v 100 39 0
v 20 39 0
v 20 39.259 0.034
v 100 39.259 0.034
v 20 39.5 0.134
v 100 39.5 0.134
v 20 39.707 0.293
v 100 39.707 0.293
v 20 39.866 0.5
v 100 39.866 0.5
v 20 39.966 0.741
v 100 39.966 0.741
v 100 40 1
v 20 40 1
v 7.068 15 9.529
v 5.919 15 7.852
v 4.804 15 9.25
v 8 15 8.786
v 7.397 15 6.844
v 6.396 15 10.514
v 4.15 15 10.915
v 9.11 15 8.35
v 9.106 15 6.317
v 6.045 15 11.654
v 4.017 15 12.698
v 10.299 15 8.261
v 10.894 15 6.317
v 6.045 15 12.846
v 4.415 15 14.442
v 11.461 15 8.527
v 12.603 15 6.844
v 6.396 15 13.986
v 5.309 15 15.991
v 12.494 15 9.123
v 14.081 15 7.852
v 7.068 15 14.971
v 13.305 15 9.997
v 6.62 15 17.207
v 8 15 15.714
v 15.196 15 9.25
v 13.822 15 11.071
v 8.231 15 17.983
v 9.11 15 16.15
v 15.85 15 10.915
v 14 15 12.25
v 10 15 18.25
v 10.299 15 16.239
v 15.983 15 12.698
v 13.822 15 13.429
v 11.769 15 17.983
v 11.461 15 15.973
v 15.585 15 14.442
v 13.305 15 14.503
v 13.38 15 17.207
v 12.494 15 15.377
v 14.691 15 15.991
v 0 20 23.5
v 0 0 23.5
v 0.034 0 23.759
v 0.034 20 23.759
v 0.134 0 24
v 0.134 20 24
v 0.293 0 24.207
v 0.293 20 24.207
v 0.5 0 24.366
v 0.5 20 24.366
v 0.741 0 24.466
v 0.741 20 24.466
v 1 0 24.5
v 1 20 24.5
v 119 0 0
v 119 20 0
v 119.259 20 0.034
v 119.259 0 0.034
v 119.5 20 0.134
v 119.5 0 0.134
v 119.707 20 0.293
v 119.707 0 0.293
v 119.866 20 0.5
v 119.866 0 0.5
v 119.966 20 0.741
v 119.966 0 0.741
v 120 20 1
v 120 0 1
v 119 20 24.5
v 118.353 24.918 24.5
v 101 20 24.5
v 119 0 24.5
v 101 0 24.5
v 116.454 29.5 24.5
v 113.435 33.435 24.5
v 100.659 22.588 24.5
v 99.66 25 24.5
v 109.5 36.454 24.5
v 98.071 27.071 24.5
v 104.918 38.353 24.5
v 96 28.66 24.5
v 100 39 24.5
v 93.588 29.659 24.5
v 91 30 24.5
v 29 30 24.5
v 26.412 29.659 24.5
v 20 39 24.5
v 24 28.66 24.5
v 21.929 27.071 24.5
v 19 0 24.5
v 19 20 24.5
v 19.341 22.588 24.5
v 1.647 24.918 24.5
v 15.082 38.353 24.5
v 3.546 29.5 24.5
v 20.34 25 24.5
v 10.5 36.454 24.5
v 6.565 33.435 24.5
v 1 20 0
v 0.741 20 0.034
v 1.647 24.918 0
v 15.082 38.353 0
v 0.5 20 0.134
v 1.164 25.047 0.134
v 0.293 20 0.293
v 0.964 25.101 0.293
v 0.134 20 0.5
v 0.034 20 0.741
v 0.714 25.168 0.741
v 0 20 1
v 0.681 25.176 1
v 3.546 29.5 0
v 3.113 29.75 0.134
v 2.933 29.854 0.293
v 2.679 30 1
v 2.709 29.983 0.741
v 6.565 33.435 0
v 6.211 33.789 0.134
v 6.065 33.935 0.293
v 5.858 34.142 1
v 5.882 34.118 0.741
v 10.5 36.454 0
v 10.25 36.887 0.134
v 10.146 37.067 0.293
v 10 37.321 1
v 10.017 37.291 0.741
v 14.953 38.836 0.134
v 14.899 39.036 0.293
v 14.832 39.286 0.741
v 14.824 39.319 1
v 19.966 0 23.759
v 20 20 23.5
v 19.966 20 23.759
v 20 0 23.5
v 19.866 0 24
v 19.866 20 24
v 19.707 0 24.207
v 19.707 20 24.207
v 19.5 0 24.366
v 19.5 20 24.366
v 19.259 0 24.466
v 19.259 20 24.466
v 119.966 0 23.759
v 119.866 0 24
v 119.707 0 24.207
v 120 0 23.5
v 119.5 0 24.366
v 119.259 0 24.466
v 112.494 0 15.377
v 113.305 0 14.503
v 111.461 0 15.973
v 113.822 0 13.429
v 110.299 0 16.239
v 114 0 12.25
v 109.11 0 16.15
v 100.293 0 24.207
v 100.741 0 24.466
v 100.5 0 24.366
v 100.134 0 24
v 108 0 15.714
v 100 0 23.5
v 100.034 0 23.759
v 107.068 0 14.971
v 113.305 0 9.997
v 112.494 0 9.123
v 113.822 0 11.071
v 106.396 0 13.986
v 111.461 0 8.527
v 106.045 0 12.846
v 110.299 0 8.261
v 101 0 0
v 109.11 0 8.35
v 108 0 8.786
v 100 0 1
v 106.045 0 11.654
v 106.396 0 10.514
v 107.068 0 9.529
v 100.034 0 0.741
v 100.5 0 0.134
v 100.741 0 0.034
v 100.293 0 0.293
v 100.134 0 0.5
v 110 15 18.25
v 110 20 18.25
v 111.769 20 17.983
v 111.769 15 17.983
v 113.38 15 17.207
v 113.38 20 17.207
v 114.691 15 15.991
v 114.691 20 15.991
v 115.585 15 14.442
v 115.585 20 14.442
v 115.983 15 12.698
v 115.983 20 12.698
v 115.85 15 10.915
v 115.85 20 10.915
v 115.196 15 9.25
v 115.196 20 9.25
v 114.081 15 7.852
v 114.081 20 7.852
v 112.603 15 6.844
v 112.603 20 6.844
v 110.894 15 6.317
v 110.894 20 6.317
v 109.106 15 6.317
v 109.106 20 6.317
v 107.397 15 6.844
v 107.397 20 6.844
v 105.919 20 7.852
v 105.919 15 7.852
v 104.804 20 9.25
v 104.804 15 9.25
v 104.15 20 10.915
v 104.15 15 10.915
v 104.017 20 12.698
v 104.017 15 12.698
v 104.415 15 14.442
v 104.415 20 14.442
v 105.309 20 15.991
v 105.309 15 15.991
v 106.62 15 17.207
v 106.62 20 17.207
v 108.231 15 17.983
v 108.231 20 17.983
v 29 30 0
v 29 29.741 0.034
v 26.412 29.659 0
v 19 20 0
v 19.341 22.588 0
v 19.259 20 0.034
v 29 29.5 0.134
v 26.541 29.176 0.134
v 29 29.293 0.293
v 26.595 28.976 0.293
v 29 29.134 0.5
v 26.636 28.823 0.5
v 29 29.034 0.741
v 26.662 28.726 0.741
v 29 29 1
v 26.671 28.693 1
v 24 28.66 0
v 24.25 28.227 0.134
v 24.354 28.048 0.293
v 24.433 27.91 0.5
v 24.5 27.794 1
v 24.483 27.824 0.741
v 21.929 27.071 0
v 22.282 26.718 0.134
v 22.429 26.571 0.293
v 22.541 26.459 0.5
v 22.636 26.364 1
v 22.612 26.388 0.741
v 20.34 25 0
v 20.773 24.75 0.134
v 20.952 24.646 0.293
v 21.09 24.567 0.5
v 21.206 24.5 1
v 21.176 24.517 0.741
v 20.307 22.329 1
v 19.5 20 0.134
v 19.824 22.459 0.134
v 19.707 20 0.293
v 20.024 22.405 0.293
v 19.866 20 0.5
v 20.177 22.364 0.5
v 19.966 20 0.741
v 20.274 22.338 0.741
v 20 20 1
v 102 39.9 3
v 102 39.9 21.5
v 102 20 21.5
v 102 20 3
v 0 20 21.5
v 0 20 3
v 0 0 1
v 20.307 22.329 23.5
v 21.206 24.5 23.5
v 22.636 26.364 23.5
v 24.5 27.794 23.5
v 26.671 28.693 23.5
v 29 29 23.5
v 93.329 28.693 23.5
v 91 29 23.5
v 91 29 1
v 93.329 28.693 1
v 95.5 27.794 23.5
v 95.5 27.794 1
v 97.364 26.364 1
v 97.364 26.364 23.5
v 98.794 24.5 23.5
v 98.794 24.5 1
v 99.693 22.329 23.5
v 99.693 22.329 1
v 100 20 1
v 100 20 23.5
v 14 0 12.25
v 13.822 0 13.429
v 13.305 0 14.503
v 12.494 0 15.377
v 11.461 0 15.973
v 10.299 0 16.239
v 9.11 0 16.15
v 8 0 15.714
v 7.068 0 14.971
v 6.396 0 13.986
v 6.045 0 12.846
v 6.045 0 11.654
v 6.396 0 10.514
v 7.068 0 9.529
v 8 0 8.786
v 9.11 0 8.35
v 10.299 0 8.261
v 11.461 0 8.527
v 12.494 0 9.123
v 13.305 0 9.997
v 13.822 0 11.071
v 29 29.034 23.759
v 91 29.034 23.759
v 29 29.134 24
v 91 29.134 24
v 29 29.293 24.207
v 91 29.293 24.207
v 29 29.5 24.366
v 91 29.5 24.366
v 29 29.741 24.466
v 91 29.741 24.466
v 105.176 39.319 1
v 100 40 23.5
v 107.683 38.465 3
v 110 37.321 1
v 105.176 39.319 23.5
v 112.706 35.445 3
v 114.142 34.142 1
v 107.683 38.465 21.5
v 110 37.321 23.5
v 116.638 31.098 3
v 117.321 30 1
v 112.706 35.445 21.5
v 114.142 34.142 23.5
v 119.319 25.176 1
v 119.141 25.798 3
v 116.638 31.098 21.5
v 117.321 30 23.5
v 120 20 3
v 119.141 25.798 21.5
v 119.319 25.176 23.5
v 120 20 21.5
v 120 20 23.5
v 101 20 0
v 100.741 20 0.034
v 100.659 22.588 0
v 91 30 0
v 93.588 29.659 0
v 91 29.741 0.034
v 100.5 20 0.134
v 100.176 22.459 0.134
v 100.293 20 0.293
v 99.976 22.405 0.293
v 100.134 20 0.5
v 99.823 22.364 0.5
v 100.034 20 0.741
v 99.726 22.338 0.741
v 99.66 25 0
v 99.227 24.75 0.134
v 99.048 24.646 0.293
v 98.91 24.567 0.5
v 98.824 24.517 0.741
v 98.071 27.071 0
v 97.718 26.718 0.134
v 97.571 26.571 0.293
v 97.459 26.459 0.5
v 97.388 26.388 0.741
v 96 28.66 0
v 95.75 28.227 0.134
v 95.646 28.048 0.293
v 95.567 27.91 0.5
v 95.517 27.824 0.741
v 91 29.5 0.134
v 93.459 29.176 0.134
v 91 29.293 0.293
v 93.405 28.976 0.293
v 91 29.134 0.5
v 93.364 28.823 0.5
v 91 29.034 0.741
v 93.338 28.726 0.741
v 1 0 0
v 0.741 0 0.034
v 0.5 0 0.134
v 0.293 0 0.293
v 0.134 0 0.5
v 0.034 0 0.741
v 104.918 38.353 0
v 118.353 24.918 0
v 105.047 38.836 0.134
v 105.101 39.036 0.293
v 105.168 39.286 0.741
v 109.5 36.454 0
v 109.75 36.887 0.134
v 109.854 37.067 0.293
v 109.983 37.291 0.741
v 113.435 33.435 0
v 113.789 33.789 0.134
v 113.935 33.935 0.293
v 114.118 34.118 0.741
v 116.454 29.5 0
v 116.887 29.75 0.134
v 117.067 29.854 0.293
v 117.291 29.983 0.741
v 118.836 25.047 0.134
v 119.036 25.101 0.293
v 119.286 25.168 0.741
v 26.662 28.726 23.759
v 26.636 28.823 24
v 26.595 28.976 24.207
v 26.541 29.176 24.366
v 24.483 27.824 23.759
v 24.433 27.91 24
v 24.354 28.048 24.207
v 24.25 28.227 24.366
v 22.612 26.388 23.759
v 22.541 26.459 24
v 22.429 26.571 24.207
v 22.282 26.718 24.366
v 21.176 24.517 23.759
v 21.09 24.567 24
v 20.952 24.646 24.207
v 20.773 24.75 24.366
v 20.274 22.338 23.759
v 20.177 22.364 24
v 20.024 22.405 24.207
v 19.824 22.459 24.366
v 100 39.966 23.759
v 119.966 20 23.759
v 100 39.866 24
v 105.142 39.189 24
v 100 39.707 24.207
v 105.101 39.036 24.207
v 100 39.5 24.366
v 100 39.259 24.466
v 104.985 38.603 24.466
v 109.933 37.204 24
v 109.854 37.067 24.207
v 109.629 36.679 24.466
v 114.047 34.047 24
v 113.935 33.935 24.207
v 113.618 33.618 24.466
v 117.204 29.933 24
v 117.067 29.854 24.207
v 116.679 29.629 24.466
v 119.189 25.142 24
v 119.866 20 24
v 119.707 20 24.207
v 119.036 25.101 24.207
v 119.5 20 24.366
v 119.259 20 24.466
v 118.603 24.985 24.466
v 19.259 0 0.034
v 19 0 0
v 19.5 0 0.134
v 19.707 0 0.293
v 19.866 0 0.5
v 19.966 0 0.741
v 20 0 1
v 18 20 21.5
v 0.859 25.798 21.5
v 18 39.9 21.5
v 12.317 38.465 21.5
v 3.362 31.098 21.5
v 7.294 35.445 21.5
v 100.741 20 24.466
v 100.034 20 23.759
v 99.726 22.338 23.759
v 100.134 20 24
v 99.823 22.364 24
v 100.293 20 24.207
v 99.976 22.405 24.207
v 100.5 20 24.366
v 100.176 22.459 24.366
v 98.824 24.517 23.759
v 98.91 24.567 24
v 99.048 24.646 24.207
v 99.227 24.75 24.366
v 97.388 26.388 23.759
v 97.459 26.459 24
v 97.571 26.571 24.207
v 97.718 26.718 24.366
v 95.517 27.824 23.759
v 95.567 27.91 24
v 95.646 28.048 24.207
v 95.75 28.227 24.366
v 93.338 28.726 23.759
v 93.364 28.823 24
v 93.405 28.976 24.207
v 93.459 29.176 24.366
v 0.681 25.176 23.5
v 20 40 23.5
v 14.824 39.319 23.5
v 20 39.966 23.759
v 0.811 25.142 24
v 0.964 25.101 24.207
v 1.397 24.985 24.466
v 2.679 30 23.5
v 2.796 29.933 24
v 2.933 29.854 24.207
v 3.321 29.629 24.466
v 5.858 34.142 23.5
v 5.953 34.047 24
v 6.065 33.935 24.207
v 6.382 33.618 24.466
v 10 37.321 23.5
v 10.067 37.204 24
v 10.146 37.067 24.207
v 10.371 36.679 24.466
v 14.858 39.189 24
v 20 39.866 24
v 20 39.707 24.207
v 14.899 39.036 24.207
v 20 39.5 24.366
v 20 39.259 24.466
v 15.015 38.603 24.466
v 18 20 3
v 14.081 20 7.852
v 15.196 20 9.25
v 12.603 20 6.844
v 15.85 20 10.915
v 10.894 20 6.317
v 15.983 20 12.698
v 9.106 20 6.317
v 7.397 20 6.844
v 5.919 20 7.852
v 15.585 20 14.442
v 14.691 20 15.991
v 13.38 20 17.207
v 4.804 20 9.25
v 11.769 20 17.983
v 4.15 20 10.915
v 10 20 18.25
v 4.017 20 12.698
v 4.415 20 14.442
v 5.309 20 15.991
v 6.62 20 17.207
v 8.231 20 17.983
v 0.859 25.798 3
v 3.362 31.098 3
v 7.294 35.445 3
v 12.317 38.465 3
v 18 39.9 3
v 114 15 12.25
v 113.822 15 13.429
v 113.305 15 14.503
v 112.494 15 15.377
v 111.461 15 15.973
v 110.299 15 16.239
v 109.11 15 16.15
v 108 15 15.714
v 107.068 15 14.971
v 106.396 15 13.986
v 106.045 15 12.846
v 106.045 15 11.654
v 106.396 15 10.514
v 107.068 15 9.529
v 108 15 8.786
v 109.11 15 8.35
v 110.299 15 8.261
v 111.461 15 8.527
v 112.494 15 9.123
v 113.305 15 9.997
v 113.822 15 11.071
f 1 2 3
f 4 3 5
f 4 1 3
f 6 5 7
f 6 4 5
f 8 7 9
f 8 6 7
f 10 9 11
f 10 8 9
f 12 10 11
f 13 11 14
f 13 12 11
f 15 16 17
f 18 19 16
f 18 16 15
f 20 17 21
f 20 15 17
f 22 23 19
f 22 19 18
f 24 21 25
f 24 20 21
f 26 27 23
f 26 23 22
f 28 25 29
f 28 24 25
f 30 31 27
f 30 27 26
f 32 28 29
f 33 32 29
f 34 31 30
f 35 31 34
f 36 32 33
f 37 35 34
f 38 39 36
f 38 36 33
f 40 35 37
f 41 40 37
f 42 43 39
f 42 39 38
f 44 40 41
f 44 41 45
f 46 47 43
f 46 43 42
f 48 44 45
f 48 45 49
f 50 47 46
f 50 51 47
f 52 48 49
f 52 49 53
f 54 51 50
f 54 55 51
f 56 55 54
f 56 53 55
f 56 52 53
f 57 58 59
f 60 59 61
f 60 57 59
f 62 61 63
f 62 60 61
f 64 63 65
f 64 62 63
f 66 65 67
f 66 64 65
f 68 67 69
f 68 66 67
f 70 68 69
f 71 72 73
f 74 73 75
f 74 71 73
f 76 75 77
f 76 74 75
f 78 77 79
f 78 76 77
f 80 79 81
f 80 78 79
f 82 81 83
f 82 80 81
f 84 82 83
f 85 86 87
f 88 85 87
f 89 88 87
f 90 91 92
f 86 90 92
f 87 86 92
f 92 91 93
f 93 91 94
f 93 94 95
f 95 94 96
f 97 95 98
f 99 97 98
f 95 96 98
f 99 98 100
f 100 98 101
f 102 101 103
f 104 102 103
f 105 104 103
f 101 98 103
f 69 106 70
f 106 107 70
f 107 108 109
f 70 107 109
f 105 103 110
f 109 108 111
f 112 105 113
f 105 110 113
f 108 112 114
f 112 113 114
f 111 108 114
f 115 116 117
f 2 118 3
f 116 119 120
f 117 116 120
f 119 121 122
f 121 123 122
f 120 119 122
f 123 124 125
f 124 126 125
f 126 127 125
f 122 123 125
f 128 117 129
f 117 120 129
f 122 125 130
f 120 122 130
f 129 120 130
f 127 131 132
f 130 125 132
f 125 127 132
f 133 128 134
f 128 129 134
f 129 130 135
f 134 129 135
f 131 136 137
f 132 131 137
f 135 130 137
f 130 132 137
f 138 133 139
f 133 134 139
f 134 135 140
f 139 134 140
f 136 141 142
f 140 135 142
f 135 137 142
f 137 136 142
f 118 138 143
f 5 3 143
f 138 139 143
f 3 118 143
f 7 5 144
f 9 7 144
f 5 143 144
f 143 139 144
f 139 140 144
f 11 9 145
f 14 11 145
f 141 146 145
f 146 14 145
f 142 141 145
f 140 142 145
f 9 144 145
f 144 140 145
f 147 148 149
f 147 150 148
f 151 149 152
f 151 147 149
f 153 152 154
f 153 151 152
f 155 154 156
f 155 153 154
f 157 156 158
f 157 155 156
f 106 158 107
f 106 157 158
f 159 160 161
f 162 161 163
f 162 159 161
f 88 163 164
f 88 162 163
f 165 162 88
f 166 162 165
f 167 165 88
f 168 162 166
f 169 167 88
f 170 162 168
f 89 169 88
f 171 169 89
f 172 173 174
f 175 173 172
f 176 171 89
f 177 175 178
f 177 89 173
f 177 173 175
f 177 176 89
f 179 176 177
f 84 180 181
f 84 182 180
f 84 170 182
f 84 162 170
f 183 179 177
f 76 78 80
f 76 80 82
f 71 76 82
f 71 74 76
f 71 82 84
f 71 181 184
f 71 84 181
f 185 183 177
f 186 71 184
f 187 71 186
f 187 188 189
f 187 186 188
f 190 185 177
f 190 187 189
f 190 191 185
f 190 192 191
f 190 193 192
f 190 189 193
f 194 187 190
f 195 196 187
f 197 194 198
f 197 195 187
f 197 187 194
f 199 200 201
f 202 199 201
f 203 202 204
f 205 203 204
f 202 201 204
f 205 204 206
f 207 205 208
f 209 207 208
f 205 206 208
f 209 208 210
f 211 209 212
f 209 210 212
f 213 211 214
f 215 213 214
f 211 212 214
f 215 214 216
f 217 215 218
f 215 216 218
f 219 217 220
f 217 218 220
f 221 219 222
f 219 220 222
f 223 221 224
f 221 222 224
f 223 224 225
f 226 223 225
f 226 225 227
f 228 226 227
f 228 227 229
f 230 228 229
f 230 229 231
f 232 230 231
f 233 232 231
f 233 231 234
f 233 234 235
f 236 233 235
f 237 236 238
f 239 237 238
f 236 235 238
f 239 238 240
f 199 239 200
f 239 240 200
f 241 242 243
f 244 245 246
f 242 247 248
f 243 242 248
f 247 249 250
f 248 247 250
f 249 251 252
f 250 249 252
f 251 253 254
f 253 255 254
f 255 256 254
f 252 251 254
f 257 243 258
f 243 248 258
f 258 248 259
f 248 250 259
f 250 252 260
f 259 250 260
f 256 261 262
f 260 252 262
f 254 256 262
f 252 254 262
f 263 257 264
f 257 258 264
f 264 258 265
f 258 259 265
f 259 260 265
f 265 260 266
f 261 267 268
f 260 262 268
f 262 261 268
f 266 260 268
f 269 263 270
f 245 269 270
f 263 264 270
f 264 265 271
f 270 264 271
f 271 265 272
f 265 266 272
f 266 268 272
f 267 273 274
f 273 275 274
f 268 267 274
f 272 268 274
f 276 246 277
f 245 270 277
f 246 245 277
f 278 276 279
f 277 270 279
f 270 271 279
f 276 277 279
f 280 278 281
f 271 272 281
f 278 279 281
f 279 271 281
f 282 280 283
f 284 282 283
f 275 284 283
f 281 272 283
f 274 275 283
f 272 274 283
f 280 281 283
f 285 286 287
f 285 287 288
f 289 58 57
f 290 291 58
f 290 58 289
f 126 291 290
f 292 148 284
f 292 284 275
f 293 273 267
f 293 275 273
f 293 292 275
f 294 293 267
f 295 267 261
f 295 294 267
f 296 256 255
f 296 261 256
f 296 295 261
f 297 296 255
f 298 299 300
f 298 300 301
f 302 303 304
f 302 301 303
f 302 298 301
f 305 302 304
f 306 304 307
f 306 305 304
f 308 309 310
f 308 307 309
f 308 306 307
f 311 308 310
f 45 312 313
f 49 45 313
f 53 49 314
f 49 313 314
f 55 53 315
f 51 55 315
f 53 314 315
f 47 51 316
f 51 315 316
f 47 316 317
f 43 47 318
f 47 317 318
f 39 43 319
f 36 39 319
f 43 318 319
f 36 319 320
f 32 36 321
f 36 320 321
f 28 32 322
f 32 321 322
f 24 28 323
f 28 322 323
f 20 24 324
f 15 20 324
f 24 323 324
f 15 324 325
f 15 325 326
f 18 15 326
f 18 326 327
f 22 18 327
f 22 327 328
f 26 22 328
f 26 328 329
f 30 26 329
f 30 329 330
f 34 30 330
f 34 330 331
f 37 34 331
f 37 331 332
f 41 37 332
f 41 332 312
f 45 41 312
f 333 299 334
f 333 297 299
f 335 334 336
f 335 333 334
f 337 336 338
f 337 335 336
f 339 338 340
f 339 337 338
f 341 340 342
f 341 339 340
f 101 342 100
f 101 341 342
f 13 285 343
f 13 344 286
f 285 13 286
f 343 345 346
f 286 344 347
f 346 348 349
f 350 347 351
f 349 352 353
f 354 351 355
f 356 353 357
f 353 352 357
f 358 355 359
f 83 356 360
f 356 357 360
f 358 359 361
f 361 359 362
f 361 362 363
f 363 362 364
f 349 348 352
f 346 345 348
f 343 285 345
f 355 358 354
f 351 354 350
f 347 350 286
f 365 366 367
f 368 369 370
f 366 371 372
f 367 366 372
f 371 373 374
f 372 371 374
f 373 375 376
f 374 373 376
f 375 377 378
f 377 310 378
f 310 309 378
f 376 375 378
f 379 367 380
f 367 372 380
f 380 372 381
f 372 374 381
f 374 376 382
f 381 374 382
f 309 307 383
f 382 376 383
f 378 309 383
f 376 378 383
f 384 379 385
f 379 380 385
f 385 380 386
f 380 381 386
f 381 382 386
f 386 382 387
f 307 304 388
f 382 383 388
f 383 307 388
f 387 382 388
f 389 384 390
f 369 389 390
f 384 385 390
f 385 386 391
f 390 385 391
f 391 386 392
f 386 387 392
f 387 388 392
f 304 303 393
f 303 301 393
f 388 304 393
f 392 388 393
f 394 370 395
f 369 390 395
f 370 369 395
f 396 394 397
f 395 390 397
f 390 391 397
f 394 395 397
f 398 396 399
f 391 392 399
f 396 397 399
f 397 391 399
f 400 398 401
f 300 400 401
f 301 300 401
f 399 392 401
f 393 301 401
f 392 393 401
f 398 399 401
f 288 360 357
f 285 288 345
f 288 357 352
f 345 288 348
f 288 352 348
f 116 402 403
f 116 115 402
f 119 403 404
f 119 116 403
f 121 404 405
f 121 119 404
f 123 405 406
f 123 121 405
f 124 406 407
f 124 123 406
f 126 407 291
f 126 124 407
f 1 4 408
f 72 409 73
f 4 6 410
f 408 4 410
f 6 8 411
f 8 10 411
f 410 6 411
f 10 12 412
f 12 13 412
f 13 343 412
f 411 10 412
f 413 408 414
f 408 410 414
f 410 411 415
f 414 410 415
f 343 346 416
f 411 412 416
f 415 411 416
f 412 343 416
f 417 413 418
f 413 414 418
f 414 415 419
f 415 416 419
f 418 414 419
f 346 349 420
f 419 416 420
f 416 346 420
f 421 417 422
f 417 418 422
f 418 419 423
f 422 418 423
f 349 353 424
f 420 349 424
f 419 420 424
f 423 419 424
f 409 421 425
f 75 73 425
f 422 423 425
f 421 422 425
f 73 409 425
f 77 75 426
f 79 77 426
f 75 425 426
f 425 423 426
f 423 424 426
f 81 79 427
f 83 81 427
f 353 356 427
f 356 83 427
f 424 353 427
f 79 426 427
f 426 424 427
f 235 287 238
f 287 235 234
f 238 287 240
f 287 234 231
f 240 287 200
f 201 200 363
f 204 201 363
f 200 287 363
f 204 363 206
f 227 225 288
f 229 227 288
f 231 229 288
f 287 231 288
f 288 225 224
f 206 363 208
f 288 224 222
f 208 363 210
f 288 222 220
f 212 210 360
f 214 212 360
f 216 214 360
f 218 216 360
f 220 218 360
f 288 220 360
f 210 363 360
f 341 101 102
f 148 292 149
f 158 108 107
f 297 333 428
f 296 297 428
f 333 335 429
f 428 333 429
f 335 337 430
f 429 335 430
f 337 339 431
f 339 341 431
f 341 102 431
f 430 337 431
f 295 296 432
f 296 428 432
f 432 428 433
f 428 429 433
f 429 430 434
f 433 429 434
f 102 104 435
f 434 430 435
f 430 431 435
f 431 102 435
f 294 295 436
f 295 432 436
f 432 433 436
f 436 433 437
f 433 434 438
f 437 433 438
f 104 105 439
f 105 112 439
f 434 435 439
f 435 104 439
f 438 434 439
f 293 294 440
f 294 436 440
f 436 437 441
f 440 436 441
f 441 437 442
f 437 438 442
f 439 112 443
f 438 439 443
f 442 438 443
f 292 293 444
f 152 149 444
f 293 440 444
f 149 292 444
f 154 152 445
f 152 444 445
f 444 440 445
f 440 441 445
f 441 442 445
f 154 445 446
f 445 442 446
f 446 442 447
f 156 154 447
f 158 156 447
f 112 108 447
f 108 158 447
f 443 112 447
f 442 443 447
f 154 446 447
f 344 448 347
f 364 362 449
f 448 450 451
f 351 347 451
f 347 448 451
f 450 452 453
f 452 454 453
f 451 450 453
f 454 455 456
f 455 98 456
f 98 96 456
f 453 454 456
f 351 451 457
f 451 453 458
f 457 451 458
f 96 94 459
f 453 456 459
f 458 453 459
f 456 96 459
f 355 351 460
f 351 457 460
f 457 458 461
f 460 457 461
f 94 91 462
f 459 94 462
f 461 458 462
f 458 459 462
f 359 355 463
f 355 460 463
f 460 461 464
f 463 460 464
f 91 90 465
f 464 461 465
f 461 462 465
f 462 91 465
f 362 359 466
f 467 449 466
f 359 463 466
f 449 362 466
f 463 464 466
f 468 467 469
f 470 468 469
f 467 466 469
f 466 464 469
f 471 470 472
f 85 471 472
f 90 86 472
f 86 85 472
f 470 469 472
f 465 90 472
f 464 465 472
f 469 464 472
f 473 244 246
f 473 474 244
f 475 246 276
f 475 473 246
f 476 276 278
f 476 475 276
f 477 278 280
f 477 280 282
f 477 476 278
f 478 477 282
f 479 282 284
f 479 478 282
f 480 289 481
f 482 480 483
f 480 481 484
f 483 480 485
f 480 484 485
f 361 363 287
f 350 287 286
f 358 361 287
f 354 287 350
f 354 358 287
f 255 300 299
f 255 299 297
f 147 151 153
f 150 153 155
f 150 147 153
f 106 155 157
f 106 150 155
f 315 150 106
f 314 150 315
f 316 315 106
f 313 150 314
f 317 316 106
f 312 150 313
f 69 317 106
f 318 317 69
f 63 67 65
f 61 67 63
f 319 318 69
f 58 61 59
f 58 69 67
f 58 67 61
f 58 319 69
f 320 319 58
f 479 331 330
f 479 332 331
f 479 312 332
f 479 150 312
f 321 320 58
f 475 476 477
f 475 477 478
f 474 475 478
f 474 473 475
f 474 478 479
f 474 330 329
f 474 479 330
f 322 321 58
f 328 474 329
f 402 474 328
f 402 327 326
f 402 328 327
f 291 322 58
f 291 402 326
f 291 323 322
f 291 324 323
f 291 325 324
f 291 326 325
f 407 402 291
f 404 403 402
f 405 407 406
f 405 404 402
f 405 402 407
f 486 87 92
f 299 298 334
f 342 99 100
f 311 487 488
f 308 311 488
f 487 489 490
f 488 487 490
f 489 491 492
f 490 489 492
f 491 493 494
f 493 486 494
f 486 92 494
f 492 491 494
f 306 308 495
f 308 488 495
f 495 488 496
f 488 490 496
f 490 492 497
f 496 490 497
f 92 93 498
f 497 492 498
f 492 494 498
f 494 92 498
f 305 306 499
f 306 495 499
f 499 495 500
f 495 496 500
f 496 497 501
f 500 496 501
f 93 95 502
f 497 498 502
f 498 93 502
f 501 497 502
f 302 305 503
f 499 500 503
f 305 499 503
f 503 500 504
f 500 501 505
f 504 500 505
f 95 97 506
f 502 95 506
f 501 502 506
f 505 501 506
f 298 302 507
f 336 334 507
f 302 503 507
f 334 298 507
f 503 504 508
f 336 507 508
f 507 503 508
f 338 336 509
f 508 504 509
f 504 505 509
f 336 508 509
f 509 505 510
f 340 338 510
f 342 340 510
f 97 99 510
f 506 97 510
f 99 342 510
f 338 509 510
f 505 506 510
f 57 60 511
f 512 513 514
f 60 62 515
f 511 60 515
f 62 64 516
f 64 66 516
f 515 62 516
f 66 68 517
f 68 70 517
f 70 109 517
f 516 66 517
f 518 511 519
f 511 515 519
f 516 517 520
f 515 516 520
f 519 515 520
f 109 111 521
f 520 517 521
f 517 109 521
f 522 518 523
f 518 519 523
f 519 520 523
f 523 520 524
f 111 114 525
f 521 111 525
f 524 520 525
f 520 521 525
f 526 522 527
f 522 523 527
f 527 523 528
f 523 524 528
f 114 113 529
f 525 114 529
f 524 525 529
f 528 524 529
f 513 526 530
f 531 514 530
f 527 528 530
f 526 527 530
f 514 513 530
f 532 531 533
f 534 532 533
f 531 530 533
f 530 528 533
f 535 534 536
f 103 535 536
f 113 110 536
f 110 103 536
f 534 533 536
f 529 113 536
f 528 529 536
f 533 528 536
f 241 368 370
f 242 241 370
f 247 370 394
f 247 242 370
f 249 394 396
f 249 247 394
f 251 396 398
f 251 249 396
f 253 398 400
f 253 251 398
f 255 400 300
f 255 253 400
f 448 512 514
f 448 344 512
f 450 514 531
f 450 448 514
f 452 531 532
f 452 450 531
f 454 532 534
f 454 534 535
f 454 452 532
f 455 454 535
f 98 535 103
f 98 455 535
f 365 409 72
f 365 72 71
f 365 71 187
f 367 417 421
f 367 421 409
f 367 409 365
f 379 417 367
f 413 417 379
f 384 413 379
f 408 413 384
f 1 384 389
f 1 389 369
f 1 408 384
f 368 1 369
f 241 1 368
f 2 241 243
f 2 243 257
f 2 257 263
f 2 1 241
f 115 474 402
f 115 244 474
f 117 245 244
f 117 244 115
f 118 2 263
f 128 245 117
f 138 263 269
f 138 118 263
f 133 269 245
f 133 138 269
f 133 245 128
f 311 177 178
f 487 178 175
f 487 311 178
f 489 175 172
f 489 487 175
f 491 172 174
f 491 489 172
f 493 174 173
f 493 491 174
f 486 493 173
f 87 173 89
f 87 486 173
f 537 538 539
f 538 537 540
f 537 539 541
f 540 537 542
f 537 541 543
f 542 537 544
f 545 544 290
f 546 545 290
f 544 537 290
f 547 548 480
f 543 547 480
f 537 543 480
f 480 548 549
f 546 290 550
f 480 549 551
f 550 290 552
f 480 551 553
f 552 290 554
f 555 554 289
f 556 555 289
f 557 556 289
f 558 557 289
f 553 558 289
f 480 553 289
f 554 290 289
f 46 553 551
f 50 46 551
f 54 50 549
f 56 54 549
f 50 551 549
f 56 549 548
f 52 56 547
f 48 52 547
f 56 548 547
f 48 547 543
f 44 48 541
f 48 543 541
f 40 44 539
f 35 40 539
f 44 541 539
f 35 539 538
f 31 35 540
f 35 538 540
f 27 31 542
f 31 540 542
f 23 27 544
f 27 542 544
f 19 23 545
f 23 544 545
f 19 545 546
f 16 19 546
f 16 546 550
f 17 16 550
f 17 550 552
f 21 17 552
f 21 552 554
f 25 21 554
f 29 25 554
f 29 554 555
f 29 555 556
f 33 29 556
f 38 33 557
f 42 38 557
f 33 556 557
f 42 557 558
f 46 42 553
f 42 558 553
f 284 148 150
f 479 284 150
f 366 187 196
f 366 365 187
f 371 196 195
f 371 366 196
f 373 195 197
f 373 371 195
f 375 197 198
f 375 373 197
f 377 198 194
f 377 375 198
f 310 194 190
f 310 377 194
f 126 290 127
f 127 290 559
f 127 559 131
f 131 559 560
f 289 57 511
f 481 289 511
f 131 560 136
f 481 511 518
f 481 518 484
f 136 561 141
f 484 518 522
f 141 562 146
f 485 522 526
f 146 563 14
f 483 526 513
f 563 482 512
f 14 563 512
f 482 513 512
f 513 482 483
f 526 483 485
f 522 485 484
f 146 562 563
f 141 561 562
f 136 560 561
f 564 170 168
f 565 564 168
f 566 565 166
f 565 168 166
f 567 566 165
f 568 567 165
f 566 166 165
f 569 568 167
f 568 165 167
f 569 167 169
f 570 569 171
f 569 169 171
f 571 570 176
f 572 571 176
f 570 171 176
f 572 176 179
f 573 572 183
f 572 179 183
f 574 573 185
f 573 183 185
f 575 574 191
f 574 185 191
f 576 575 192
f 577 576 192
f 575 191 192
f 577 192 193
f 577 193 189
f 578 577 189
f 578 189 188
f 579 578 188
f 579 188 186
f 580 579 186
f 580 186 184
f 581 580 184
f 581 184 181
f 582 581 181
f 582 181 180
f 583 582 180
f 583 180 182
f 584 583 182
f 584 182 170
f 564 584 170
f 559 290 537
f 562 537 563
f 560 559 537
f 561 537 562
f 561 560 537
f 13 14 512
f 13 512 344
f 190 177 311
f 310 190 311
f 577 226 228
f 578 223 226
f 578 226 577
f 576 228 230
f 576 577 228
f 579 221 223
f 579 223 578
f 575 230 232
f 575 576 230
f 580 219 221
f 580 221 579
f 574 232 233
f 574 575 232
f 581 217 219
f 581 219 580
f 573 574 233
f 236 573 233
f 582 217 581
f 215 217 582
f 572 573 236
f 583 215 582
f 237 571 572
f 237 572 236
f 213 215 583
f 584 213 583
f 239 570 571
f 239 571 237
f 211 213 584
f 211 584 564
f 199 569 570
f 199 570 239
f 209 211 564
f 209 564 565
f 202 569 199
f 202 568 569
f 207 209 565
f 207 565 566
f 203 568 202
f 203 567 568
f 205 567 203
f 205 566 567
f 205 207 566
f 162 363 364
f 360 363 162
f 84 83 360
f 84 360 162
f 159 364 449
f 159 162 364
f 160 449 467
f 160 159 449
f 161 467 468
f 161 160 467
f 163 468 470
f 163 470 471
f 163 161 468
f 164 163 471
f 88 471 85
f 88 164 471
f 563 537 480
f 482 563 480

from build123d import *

# Parameters (mm, degrees)
EXTRUDE_1_DEPTH     = 24.5
FILLET_1_R          = 20
FILLET_2_R          = 9
SKETCH_2_W          = 18.5
SKETCH_2_H          = 26.060105981
CUT_EXTRUDE_1_DEPTH = 18
SKETCH_3_W          = 18.5
SKETCH_3_H          = 21.487076152
CUT_EXTRUDE_2_DEPTH = 18
FILLET_3_R          = 1
SKETCH_6_R          = 4
CUT_EXTRUDE_3_DEPTH = 129.841957452
SKETCH_7_R          = 6
CUT_EXTRUDE_4_DEPTH = 5


with BuildPart() as part:
    # Эскиз1 → Бобышка-Вытянуть1 (new body)
    with BuildSketch(Plane.XY):
        Polygon((0, 0), (0, 40), (120, 40), (120, 0), (100, 0), (100, 29), (20, 29), (20, 0), align=None)
    extrude(amount=EXTRUDE_1_DEPTH)

    # Скругление1
    fillet_1_edges = [part.edges().sort_by_distance(p)[0] for p in [
        (0, 40, 12.25),
        (120, 40, 12.25),
    ]]
    fillet(fillet_1_edges, radius=FILLET_1_R)

    # Скругление2
    fillet_2_edges = [part.edges().sort_by_distance(p)[0] for p in [
        (100, 29, 12.25),
        (20, 29, 12.25),
    ]]
    fillet(fillet_2_edges, radius=FILLET_2_R)

    # Эскиз2 → Вырез-Вытянуть1 (cut)
    with BuildSketch(Plane(origin=(120, 0, 0), x_dir=(0, 0, -1), z_dir=(1, 0, 0))):
        with Locations((-12.25, 33.03005299)):
            Rectangle(SKETCH_2_W, SKETCH_2_H)
    extrude(amount=-CUT_EXTRUDE_1_DEPTH, mode=Mode.SUBTRACT)

    # Эскиз3 → Вырез-Вытянуть2 (cut)
    with BuildSketch(Plane.ZY):
        with Locations((12.25, 30.743538076)):
            Rectangle(SKETCH_3_W, SKETCH_3_H)
    extrude(amount=-CUT_EXTRUDE_2_DEPTH, mode=Mode.SUBTRACT)

    # Скругление3
    fillet_3_edges = [part.edges().sort_by_distance(p)[0] for p in [
        (20, 10, 0),
        (120, 10, 24.5),
        (0, 10, 0),
        (0, 10, 24.5),
        (60, 40, 0),
        (114.142135624, 34.142135624, 0),
        (5.857864376, 34.142135624, 0),
        (60, 40, 24.5),
        (114.142135624, 34.142135624, 24.5),
        (5.857864376, 34.142135624, 24.5),
        (60, 29, 0),
        (60, 29, 24.5),
        (100, 10, 0),
        (100, 10, 24.5),
        (22.636038969, 26.363961031, 0),
        (22.636038969, 26.363961031, 24.5),
        (97.363961031, 26.363961031, 0),
        (97.363961031, 26.363961031, 24.5),
        (20, 10, 24.5),
        (120, 10, 0),
    ]]
    fillet(fillet_3_edges, radius=FILLET_3_R)

    # Эскиз6 → Вырез-Вытянуть3 (cut, through all)
    with BuildSketch(Plane(origin=(0, 0, 0), x_dir=(-1, 0, 0), z_dir=(0, -1, 0))):
        with Locations(Location((-10, -12.25, 0), (0, 0, 180))):
            Circle(SKETCH_6_R)
        with Locations(Location((-110, -12.25, 0), (0, 0, 180))):
            Circle(SKETCH_6_R)
    extrude(amount=-CUT_EXTRUDE_3_DEPTH, mode=Mode.SUBTRACT)

    # Эскиз7 → Вырез-Вытянуть4 (cut)
    with BuildSketch(Plane(origin=(0, 20, 0), x_dir=(1, 0, 0), z_dir=(0, 1, 0))):
        with Locations(Location((10, -12.25, 0), (0, 0, 270))):
            Circle(SKETCH_7_R)
        with Locations(Location((110, -12.25, 0), (0, 0, 270))):
            Circle(SKETCH_7_R)
    extrude(amount=-CUT_EXTRUDE_4_DEPTH, mode=Mode.SUBTRACT)


solid = part.part
